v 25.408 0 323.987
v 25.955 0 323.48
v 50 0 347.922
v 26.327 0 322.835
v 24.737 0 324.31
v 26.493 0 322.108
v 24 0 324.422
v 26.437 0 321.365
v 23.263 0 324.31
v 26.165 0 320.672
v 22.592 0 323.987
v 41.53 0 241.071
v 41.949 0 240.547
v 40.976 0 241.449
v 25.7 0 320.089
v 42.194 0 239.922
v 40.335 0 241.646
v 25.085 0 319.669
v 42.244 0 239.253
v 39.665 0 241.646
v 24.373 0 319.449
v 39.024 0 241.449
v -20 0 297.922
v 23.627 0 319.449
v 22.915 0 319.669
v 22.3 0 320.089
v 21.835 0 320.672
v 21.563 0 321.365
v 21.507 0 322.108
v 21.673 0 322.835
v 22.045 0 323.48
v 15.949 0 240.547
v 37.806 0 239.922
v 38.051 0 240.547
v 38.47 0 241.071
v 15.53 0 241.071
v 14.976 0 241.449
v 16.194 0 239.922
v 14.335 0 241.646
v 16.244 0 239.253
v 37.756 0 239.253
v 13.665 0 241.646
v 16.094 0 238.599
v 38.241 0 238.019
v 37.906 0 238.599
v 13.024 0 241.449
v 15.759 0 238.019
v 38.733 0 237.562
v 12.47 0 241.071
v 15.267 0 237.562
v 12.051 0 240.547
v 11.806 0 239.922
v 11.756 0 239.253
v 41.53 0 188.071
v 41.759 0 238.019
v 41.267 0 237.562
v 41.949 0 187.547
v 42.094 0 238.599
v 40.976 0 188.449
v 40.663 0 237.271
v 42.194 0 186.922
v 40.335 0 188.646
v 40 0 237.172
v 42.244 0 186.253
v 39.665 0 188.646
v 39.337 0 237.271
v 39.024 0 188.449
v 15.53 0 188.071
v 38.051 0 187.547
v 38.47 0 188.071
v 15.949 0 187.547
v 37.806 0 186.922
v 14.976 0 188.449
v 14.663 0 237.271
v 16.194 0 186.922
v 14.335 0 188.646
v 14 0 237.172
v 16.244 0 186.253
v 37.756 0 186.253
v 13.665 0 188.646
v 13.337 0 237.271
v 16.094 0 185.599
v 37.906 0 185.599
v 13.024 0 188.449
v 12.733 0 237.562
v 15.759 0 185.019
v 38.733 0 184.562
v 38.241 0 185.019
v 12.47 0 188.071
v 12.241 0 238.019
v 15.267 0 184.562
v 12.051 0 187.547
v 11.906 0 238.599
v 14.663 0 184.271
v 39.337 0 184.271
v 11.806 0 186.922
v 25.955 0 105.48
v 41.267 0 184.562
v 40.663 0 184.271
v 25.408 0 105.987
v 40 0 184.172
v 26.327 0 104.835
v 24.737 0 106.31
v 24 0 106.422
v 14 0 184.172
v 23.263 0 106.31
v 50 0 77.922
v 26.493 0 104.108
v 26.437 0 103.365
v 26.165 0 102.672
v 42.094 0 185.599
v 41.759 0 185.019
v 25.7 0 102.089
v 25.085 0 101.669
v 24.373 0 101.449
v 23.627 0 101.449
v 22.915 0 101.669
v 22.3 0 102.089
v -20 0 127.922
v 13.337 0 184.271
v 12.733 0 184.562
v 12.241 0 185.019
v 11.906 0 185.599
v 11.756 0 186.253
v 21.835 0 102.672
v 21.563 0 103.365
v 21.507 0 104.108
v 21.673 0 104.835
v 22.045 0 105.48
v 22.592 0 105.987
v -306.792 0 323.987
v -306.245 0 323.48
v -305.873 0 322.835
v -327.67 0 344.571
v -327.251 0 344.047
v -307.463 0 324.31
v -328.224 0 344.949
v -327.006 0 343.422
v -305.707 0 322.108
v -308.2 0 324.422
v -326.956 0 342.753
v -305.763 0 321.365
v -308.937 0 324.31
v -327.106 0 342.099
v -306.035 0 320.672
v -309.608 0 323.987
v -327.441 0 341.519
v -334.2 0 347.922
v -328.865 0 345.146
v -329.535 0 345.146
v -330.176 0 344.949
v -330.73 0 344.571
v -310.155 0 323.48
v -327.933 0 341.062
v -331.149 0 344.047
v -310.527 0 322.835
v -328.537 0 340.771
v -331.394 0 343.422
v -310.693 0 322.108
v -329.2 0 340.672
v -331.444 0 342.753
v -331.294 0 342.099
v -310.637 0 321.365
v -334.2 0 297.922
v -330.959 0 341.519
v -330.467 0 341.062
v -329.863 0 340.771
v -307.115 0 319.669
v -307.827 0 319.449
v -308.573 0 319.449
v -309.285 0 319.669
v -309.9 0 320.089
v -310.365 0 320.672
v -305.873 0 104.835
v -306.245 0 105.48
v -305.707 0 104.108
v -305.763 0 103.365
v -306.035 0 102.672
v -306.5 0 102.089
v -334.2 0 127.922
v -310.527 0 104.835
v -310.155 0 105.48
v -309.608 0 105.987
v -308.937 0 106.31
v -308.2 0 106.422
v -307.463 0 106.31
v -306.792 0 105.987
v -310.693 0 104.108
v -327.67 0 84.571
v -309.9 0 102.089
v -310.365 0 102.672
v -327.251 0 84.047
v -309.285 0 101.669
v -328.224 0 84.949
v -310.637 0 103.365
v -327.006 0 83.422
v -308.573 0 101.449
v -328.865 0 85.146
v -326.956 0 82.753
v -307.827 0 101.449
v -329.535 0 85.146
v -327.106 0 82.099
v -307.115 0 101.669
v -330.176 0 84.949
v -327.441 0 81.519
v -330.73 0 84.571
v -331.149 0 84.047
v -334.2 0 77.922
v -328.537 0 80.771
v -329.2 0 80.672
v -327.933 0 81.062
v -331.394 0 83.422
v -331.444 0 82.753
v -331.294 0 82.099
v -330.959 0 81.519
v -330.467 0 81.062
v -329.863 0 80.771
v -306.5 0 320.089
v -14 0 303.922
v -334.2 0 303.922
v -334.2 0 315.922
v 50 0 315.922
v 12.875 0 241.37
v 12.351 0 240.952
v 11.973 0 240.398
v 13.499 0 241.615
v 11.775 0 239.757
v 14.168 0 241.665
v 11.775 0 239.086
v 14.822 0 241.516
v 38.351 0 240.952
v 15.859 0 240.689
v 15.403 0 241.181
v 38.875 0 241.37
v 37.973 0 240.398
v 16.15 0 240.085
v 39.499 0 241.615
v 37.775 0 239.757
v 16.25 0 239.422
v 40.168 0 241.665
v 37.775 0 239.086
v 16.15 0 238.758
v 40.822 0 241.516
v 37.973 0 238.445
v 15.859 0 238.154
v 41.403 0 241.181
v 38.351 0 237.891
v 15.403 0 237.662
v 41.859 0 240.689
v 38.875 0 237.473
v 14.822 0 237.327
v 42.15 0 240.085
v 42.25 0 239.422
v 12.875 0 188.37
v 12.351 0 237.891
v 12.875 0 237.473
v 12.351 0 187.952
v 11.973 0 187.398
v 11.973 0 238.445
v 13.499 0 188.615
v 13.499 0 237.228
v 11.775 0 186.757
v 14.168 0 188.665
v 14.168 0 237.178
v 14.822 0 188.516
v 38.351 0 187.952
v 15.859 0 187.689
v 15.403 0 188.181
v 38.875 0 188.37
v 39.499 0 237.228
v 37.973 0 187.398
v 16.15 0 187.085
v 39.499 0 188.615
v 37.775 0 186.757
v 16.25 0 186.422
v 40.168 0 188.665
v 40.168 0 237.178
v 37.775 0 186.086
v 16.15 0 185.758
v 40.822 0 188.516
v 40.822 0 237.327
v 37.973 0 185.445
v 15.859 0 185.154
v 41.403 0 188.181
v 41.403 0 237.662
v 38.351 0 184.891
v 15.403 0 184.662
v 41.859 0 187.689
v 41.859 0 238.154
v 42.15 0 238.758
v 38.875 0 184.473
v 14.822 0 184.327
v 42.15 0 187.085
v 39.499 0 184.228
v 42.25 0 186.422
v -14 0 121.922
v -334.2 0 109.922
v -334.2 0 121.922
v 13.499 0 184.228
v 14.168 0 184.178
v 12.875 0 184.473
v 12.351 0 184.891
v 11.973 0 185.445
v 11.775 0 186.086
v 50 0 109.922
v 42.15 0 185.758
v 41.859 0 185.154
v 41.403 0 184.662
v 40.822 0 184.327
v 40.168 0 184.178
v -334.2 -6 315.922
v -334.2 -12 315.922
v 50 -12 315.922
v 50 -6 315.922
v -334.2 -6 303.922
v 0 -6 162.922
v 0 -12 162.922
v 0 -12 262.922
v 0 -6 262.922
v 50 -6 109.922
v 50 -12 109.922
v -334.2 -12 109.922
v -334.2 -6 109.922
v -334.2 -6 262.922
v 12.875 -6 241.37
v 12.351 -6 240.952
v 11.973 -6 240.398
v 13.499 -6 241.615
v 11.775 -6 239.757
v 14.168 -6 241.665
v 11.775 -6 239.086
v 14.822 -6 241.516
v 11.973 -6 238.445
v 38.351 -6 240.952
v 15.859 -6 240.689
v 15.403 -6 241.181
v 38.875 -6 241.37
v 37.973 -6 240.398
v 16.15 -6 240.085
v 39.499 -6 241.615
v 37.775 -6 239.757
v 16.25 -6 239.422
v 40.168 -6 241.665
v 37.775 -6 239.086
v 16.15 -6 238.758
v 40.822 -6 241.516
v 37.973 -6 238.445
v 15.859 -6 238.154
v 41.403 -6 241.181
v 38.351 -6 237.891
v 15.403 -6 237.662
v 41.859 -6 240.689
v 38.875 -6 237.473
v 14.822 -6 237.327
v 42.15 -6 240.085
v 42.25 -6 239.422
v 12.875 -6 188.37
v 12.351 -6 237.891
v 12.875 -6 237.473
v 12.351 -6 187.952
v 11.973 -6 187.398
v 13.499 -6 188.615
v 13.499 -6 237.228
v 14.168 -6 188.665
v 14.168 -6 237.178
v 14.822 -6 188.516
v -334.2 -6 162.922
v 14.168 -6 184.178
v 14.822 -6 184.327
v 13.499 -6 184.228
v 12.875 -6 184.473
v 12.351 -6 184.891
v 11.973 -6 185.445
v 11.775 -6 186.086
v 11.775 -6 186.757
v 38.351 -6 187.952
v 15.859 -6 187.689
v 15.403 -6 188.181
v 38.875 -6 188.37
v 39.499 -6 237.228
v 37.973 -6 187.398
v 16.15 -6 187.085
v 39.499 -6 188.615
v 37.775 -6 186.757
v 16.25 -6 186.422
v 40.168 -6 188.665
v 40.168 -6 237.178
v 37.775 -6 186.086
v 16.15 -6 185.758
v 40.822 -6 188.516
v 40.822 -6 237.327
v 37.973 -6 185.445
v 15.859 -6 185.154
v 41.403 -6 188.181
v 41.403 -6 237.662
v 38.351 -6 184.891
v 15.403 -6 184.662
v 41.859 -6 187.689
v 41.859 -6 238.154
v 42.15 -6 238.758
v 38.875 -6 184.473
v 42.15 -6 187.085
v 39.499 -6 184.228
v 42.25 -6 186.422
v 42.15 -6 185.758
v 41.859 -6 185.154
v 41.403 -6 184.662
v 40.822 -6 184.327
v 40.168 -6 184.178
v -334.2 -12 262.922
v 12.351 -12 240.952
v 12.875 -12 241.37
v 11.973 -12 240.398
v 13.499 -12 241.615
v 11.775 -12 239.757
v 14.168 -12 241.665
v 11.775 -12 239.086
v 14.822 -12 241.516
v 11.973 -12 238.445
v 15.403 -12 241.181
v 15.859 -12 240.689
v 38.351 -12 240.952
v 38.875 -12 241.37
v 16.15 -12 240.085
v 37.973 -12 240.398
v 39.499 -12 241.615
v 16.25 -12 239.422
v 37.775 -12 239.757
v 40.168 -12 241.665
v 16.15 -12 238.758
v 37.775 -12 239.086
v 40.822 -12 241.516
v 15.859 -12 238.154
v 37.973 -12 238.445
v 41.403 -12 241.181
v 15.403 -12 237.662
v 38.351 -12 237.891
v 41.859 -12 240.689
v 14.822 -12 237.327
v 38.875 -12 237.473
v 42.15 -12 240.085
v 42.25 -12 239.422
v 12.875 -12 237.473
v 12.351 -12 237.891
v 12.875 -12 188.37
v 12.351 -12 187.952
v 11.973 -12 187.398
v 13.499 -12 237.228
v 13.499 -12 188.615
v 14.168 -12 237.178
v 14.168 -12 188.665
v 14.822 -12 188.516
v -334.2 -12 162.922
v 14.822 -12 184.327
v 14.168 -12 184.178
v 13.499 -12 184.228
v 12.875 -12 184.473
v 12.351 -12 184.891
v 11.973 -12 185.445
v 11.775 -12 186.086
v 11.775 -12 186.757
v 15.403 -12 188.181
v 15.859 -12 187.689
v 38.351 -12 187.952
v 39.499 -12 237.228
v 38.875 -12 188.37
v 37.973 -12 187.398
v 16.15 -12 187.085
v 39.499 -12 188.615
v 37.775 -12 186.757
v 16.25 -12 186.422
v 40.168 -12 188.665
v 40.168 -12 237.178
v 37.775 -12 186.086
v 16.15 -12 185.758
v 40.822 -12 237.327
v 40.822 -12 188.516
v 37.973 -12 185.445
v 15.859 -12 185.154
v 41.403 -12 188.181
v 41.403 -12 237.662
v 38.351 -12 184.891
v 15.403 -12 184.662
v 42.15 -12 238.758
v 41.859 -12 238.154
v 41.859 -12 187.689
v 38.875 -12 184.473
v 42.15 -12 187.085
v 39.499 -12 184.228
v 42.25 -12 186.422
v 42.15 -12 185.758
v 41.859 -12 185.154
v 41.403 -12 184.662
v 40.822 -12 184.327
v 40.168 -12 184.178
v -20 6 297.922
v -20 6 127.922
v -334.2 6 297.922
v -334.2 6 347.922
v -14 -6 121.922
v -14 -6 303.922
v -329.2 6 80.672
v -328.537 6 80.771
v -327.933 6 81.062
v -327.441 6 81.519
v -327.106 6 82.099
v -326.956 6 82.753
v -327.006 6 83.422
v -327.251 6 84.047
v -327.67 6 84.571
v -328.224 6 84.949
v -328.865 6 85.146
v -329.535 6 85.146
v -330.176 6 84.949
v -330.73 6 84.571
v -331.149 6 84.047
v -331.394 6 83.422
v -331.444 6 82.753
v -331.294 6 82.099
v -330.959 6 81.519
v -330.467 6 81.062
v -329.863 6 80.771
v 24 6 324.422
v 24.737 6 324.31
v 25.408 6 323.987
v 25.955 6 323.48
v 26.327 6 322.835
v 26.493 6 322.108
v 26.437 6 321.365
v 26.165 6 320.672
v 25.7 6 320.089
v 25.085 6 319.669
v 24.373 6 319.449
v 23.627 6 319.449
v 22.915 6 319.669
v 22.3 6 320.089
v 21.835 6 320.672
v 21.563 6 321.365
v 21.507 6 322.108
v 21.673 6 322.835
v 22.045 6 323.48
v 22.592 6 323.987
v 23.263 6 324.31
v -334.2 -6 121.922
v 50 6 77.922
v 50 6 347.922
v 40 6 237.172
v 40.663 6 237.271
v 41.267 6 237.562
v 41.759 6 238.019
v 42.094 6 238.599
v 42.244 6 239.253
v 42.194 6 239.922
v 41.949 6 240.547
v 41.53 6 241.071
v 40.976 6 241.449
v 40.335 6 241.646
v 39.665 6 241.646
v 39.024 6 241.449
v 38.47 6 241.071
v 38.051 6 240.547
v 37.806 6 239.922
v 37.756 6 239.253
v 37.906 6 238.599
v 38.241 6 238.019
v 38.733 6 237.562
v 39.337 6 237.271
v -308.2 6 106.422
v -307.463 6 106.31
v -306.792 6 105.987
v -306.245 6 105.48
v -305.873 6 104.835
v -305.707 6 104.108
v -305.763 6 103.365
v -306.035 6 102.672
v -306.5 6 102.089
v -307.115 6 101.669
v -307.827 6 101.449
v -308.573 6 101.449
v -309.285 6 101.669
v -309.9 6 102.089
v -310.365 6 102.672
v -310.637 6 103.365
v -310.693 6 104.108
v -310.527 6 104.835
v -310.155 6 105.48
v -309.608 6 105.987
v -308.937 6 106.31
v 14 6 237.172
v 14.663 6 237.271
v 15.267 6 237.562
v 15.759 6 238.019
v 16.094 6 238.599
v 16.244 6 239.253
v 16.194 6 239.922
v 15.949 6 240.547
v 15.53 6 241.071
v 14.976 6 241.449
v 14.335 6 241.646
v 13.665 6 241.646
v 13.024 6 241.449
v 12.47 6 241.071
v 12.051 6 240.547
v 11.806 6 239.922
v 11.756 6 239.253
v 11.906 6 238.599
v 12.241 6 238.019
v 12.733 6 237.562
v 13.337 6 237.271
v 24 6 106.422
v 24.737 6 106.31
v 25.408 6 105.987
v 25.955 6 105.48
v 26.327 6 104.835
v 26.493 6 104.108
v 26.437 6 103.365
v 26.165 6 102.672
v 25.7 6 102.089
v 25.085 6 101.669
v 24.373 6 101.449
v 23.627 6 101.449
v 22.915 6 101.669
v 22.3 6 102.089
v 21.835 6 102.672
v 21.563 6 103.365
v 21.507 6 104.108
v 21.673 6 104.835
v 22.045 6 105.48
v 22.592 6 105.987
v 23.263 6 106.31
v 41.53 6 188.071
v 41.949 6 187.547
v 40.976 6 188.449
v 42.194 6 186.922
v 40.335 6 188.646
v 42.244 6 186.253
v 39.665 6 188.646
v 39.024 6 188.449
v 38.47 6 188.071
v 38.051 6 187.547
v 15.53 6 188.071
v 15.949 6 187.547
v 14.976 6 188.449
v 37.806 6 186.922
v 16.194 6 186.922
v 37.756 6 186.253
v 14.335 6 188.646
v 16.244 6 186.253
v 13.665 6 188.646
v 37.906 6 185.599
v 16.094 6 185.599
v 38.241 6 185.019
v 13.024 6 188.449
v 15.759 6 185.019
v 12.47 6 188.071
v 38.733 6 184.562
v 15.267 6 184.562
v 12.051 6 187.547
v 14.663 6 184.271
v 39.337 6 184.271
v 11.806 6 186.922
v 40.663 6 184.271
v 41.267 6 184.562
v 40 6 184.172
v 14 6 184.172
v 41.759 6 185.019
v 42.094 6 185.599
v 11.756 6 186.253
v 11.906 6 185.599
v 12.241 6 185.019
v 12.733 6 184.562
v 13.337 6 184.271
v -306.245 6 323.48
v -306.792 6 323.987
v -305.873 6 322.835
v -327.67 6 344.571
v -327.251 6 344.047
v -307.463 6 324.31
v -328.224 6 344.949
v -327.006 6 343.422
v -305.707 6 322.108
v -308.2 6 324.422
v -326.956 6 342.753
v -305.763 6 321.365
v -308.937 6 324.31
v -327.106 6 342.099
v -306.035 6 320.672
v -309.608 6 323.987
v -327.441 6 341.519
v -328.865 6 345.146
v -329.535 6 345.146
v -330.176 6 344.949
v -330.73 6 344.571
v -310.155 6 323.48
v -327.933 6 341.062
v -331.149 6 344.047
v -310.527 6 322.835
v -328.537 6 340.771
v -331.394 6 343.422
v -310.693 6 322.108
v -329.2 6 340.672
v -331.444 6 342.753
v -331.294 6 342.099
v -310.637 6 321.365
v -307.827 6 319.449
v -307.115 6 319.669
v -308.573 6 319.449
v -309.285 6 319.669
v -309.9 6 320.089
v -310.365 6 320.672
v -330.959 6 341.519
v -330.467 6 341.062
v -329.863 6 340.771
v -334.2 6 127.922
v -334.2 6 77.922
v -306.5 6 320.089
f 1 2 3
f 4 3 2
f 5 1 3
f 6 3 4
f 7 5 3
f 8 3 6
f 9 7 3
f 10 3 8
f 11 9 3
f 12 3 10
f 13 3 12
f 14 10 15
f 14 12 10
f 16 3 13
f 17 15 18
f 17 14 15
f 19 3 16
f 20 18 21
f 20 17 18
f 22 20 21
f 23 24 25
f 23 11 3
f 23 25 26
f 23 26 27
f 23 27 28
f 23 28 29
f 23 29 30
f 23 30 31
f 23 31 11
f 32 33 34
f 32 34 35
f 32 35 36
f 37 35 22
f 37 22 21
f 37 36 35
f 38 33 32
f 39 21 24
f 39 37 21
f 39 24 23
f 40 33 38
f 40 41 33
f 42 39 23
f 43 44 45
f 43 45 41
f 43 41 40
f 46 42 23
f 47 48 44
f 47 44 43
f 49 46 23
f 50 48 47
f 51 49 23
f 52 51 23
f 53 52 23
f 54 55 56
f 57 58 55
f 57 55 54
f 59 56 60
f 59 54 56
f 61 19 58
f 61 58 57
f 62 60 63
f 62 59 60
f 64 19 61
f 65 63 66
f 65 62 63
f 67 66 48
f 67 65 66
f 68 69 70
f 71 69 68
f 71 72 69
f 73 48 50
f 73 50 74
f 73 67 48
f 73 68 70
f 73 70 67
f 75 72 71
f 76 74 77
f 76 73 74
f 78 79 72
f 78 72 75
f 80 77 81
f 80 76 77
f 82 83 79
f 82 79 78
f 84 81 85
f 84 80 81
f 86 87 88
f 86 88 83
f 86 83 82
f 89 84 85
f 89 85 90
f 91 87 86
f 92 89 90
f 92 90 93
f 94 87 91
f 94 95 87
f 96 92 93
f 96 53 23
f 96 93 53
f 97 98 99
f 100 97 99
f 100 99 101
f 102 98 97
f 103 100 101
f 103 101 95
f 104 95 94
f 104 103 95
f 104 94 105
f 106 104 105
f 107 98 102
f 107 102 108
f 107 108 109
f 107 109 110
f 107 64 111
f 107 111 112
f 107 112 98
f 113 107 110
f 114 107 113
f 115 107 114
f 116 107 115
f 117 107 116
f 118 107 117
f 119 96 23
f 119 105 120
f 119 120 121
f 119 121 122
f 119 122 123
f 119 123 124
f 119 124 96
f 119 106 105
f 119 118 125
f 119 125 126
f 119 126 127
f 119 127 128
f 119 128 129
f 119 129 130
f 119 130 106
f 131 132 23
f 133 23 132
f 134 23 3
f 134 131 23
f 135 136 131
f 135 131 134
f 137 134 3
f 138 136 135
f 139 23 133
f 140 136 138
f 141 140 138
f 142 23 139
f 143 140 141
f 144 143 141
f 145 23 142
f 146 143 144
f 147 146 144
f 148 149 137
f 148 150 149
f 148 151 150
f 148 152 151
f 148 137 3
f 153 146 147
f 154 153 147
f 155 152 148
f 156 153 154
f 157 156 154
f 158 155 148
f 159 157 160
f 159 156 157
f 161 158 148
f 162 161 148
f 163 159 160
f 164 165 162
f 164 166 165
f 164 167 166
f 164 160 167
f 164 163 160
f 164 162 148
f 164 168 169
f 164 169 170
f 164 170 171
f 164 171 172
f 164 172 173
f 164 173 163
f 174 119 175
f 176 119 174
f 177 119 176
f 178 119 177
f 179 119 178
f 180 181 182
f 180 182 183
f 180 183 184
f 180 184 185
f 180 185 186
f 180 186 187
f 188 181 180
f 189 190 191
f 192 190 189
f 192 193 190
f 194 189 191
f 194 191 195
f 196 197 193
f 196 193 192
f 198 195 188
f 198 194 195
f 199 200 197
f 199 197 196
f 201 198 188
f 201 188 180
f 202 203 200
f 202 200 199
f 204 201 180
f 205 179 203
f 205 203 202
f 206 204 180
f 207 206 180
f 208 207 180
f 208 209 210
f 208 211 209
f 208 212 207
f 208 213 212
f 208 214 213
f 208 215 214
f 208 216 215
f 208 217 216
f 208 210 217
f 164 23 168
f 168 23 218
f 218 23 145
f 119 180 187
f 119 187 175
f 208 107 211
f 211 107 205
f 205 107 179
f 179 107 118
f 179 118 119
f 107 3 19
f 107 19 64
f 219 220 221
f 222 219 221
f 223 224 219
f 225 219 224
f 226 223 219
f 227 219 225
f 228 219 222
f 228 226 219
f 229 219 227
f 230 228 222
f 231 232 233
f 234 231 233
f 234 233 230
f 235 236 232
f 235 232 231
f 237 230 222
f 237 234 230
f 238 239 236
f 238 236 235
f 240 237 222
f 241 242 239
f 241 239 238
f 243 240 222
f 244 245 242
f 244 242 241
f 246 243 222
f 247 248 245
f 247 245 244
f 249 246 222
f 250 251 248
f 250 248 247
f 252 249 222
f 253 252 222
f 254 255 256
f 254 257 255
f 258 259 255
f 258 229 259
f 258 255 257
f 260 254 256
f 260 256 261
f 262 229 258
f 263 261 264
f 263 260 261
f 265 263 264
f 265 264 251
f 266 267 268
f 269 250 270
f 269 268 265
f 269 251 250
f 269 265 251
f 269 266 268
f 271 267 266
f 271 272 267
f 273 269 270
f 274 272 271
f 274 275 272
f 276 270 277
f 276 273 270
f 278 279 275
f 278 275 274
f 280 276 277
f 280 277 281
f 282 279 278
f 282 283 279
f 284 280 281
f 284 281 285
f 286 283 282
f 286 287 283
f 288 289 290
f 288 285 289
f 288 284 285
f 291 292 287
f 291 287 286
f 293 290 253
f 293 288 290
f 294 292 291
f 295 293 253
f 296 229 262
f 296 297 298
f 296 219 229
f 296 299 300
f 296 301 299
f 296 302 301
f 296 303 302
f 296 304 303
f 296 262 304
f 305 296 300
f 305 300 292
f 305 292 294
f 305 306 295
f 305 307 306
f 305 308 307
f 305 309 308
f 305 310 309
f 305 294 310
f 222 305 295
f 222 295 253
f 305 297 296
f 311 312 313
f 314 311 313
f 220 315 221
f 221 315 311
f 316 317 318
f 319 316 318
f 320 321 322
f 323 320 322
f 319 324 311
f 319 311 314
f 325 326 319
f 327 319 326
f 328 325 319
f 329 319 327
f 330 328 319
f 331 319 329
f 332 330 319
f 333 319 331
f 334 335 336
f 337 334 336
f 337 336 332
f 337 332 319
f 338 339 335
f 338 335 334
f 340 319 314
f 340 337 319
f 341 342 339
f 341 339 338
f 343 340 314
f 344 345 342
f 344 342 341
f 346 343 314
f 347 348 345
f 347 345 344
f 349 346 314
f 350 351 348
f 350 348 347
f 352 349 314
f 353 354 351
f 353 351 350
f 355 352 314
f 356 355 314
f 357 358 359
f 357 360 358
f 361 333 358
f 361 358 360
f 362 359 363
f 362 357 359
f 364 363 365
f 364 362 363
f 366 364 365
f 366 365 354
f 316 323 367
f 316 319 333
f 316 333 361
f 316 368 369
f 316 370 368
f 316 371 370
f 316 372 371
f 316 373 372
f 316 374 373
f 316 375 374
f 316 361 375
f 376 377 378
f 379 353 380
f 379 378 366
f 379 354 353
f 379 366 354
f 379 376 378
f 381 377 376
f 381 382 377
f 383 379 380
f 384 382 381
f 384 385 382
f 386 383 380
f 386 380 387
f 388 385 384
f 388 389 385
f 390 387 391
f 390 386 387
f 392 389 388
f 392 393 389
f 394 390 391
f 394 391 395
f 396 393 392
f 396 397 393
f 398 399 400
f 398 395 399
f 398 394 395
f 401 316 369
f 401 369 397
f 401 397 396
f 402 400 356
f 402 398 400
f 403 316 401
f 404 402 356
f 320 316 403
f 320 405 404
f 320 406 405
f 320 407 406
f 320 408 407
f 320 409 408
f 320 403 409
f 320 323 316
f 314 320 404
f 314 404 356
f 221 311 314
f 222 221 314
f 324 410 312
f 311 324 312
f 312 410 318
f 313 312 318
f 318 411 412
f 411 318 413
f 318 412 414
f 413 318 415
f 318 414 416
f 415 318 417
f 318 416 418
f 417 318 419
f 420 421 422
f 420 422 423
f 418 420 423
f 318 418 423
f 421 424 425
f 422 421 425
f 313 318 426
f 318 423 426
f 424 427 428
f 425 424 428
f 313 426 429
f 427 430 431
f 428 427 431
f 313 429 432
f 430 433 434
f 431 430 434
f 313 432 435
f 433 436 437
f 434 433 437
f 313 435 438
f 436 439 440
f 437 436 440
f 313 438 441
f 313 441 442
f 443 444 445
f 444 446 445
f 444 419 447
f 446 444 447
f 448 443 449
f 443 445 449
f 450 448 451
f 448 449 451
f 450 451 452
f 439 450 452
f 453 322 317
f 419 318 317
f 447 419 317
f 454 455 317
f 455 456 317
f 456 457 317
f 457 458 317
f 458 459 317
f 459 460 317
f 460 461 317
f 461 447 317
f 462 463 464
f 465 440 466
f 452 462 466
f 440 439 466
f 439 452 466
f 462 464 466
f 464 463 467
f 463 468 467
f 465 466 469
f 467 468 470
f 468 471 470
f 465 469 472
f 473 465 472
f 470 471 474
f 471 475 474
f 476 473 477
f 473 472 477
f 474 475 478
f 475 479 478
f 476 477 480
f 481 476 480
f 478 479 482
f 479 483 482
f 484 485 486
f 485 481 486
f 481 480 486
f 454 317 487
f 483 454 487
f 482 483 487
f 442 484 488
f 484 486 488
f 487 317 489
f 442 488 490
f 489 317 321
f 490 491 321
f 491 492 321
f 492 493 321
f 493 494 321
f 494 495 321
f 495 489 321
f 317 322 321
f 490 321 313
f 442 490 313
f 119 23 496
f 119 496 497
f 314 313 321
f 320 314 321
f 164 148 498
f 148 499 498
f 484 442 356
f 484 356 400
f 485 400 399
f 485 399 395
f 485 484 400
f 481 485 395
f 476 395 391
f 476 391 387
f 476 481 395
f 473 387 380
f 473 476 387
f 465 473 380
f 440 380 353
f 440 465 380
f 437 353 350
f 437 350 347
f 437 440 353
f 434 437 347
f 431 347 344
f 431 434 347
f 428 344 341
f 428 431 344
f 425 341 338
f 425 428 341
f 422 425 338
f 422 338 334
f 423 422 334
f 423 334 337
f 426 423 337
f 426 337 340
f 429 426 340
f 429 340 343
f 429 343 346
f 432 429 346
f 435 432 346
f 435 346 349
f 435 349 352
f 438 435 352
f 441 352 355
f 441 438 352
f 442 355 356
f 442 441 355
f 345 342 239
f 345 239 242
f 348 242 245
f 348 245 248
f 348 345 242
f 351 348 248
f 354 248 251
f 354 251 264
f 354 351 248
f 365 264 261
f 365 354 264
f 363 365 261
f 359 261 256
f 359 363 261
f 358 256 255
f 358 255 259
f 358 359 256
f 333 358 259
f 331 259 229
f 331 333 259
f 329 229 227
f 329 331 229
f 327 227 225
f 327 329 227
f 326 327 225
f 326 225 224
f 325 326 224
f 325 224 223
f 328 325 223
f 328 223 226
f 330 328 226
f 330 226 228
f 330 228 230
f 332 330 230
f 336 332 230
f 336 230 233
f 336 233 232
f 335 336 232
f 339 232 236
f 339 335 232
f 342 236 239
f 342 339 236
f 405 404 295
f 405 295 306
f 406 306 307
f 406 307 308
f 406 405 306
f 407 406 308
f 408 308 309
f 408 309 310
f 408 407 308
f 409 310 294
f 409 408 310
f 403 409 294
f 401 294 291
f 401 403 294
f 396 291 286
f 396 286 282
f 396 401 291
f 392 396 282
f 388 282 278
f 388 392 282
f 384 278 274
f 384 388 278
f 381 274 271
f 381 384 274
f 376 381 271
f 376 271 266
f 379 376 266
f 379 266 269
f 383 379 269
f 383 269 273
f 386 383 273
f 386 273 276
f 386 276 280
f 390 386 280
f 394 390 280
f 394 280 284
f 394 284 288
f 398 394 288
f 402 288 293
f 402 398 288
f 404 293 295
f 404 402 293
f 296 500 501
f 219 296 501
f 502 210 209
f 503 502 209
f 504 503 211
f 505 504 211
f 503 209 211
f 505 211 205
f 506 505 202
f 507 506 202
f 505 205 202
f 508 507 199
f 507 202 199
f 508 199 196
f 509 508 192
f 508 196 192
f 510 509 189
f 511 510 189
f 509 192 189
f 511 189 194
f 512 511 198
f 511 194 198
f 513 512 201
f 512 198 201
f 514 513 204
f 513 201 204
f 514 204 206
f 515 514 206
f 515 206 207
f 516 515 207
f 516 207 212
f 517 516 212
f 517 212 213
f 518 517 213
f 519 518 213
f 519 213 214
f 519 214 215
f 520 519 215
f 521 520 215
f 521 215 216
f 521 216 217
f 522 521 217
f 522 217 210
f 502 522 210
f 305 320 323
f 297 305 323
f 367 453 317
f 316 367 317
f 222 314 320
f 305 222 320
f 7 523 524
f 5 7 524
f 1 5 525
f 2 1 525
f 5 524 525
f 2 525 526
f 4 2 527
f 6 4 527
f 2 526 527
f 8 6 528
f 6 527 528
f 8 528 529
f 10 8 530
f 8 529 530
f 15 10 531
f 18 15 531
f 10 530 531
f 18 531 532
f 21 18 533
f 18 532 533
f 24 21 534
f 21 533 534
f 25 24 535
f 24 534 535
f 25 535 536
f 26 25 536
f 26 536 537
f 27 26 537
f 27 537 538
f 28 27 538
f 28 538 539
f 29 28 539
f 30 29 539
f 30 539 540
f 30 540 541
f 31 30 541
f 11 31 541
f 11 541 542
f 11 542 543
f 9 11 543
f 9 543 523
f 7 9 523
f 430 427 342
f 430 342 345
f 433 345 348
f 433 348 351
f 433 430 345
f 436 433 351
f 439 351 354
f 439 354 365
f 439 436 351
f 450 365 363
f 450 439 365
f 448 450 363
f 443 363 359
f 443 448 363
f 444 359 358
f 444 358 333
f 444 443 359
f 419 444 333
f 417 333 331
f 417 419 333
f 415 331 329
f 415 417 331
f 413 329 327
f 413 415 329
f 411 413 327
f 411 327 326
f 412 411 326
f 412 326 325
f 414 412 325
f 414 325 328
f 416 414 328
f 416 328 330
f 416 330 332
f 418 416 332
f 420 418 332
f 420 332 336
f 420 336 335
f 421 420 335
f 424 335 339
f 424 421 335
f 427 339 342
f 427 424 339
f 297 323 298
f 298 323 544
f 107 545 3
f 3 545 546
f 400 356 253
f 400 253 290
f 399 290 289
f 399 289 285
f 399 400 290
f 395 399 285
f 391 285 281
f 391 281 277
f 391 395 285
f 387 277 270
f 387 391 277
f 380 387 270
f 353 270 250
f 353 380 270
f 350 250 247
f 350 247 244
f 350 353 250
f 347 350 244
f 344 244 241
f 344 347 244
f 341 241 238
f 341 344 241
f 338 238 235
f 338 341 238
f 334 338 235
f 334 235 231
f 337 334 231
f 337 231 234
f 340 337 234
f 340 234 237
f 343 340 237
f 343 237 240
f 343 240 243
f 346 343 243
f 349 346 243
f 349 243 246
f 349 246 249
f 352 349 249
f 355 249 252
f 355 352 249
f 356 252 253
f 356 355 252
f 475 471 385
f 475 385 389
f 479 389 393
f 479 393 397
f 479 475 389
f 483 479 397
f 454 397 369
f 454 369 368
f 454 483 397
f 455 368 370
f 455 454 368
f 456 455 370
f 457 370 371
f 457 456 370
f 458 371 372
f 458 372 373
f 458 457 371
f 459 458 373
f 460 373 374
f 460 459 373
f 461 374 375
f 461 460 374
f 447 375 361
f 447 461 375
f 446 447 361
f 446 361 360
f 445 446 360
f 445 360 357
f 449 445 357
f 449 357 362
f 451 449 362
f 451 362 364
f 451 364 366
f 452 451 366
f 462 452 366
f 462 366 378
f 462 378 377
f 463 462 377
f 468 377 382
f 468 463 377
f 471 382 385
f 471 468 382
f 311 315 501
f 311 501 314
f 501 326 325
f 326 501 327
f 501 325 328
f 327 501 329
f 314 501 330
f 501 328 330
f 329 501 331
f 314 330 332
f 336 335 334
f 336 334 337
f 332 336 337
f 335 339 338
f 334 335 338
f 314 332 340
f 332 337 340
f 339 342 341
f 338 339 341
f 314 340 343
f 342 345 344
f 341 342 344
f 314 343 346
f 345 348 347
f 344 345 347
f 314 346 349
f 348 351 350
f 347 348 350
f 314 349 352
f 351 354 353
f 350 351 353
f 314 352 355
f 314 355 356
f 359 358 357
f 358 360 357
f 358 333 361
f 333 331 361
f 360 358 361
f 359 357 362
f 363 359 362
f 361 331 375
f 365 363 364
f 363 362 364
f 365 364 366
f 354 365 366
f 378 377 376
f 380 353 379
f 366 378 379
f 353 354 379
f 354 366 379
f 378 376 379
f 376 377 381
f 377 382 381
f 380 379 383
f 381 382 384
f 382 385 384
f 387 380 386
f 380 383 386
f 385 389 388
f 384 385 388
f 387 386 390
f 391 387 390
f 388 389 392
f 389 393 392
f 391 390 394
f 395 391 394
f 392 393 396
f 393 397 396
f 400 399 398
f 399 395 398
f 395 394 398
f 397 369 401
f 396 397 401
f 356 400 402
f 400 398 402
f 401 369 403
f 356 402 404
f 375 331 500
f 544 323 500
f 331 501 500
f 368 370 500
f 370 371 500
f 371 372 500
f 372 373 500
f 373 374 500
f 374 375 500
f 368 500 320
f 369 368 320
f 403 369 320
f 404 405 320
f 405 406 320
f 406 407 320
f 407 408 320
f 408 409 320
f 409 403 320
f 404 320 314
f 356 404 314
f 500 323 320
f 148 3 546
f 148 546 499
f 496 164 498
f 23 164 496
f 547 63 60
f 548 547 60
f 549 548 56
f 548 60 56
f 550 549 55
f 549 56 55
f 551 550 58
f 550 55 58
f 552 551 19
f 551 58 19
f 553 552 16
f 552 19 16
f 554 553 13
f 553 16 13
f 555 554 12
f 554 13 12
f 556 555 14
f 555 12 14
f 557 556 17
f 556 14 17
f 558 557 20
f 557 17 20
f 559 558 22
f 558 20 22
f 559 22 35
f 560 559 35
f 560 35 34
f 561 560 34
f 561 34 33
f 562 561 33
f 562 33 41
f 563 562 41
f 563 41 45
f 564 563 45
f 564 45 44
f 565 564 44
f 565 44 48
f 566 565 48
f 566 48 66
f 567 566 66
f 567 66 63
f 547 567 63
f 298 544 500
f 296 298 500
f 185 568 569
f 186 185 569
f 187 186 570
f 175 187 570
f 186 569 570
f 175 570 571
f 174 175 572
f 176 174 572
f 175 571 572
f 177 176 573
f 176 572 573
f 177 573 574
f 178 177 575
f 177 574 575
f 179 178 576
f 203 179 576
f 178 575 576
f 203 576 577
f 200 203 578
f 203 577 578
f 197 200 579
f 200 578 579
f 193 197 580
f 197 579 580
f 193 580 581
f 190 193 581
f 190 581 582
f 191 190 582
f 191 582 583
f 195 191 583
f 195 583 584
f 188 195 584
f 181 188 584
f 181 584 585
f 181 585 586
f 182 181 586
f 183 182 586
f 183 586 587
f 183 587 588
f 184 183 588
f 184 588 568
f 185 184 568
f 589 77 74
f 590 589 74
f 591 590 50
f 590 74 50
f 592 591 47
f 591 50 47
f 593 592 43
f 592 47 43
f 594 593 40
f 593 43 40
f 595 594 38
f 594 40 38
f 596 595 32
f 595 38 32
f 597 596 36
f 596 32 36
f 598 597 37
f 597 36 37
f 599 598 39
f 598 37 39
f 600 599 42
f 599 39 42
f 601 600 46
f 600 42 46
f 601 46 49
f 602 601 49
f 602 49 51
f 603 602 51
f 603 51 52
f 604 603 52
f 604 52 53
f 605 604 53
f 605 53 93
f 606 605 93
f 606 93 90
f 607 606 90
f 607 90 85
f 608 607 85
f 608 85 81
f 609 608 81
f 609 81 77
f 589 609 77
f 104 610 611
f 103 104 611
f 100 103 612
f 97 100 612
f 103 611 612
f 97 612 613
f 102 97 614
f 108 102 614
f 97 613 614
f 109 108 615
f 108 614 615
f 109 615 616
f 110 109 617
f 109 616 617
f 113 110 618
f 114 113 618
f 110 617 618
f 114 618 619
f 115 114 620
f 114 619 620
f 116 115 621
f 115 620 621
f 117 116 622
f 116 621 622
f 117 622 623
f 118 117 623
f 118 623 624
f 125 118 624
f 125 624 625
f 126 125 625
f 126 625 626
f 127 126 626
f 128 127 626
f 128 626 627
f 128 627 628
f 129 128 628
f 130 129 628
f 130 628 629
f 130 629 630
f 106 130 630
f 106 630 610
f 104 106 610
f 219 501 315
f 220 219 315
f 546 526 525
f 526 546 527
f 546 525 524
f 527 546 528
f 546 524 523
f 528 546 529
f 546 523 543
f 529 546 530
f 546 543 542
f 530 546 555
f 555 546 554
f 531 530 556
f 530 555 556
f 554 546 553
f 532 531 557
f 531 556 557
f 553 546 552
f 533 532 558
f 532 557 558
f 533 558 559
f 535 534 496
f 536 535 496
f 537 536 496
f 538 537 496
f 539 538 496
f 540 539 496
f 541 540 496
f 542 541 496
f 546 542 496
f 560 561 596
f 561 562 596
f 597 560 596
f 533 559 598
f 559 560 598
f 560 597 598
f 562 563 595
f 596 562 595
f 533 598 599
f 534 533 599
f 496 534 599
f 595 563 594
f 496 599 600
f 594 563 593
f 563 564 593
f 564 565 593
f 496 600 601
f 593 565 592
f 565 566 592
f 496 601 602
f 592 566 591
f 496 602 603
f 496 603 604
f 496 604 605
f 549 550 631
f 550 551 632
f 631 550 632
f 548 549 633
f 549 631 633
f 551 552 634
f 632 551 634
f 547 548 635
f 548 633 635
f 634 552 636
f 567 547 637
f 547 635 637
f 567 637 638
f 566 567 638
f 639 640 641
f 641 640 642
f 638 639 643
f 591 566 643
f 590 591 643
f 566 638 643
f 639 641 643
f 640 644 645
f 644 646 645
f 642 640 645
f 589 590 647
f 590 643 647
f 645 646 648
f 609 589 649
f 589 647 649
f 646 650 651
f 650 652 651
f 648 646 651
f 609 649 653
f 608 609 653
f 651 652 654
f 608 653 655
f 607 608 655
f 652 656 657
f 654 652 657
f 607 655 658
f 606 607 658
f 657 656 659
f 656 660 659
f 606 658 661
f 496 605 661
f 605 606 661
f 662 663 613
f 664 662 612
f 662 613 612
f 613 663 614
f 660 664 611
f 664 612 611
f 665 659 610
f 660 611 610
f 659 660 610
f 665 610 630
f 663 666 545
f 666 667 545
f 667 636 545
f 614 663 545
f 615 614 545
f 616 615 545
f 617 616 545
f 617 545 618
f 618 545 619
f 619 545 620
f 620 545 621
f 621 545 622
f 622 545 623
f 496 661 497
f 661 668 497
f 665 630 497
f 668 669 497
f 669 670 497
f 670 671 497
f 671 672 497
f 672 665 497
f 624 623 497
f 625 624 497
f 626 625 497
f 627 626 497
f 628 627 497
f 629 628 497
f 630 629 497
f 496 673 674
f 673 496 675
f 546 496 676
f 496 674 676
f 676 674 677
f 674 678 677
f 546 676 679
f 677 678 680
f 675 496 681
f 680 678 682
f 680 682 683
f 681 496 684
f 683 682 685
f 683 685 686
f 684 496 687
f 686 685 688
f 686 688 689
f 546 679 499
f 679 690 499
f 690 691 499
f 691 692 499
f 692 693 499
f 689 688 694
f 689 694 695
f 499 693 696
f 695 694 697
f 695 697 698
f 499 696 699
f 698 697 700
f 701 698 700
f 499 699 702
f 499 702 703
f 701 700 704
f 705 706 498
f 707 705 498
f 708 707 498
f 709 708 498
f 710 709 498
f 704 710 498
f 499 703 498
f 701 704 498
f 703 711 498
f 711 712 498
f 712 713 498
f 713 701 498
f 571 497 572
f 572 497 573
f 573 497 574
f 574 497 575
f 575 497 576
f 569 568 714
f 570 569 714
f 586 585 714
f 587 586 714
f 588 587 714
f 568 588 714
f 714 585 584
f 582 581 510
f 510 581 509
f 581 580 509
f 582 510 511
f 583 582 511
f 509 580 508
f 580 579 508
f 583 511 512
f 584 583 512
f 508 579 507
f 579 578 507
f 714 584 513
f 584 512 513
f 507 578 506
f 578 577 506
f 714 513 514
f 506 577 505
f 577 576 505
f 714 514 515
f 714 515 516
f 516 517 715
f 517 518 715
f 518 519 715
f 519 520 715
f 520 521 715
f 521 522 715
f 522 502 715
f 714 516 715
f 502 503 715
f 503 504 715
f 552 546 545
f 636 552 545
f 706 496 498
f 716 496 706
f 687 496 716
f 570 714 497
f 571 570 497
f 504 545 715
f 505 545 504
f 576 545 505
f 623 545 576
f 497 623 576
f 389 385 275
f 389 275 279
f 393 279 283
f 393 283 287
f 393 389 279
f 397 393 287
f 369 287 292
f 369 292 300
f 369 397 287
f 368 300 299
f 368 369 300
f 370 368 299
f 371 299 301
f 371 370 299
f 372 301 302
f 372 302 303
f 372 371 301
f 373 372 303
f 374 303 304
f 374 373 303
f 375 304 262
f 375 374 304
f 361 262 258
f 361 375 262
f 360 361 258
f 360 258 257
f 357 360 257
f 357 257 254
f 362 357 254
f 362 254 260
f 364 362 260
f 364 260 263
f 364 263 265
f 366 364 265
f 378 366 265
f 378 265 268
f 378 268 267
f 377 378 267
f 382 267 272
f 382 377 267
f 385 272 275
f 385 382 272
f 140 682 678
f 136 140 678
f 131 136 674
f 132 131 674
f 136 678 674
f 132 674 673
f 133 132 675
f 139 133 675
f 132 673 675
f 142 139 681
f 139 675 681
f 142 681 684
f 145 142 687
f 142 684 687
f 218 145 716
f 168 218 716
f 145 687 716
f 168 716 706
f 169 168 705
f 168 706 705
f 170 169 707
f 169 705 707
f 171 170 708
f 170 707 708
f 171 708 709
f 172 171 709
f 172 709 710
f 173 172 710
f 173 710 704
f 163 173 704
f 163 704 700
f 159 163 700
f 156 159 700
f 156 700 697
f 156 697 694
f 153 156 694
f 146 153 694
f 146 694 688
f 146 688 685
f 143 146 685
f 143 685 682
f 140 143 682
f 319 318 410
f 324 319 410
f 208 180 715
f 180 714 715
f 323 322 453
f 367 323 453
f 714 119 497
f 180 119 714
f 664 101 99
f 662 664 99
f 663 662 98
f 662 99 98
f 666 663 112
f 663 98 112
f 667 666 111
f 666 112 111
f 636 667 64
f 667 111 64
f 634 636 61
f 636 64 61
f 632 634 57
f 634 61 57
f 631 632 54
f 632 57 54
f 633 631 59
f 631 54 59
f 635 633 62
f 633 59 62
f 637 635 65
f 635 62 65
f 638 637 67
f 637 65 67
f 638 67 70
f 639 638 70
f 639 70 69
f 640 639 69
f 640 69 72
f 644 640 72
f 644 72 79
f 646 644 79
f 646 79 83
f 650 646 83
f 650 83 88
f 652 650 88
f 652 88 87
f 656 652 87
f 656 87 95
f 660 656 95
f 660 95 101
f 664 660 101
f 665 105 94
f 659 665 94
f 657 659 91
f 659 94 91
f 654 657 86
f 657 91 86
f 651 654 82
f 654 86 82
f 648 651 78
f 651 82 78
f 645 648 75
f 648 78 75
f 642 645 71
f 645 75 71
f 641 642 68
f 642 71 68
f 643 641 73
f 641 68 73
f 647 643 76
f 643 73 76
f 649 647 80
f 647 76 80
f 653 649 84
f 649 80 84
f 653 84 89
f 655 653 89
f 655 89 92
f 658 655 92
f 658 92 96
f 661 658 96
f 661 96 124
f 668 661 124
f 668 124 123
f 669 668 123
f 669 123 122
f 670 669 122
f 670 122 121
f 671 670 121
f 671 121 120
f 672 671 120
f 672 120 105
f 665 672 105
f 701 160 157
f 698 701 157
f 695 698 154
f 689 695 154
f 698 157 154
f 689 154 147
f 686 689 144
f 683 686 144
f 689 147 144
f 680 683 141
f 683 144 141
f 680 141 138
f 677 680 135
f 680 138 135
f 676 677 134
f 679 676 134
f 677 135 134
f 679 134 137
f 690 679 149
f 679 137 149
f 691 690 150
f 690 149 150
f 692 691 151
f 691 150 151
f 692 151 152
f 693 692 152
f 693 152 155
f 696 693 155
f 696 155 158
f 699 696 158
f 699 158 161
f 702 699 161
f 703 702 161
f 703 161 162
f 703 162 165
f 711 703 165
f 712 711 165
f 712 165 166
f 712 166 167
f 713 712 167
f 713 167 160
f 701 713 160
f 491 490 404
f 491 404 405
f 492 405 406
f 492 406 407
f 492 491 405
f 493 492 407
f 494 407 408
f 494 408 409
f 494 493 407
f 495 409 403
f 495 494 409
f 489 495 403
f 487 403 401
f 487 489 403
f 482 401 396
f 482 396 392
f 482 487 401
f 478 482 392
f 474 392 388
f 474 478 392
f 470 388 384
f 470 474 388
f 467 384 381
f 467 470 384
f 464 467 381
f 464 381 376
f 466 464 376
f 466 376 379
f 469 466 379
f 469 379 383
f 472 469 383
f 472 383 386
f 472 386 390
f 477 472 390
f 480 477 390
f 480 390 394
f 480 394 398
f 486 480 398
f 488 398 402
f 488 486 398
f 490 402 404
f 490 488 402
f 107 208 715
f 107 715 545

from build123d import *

# Parameters (mm, degrees)
EXTRUDE_2_DEPTH             = 6
EXTRUDE_3_DEPTH             = 6
SKETCH_4_R                  = 2.5
CUT_EXTRUDE_1_DEPTH         = 483.579543495
PATTERN_LINEAR_2_COUNT      = 2
PATTERN_LINEAR_2_PITCH      = 332.2
PATTERN_LINEAR_2_COUNT_DIR2 = 2
PATTERN_LINEAR_2_PITCH_DIR2 = 218
EXTRUDE_4_DEPTH             = 6
SKETCH_6_R                  = 2.25
CUT_EXTRUDE_2_DEPTH         = 483.766005224
SKETCH_7_R                  = 2.25
CUT_EXTRUDE_3_DEPTH         = 483.579543495
SPLIT_START                 = -12
SPLIT_BODIES_1_OUTLINE_R    = 2.25
SPLIT_BODIES_1_DEPTH        = 12
SPLIT_START_2               = -6
SPLIT_BODIES_1_2_OUTLINE_R  = 2.25
SPLIT_BODIES_1_2_DEPTH      = 6
SPLIT_BODIES_1_3_OUTLINE_R  = 2.25
SPLIT_BODIES_1_3_DEPTH      = 6


# Read off the part's stored shape, not the designer's step: Разделить1
with BuildPart() as part:
    # Эскиз1 → Бобышка-Вытянуть2 (new body)
    with BuildSketch(Plane(origin=(0, 0, 0), x_dir=(1, 0, 0), z_dir=(0, 1, 0))):
        Polygon((50, -77.921508101), (50, -347.921508101), (-334.2, -347.921508101), (-334.2, -297.921508101), (-20, -297.921508101), (-20, -127.921508101), (-334.2, -127.921508101), (-334.2, -77.921508101), align=None)
    extrude(amount=EXTRUDE_2_DEPTH)

    # Эскиз2 → Бобышка-Вытянуть3 (add)
    with BuildSketch(Plane.XZ):
        Polygon((50, 315.921508101), (50, 109.921508101), (-334.2, 109.921508101), (-334.2, 121.921508101), (-14, 121.921508101), (-14, 303.921508101), (-334.2, 303.921508101), (-334.2, 315.921508101), align=None)
    extrude(amount=EXTRUDE_3_DEPTH)

    # Эскиз4 → Вырез-Вытянуть1 (cut, through all)
    with BuildSketch(Plane(origin=(0, 6, 0), x_dir=(1, 0, 0), z_dir=(0, 1, 0))):
        with Locations(Location((-308.2, -103.921508101, 0), (0, 0, 270))):
            Circle(SKETCH_4_R)
    cut_extrude_1 = extrude(amount=-CUT_EXTRUDE_1_DEPTH, mode=Mode.SUBTRACT)

    # Линейный массив2: Cut-Extrude 1 2 × 2
    with Locations(*[(i * PATTERN_LINEAR_2_PITCH, 0, j * PATTERN_LINEAR_2_PITCH_DIR2) for i in range(PATTERN_LINEAR_2_COUNT) for j in range(PATTERN_LINEAR_2_COUNT_DIR2) if (i, j) != (0, 0)]):
        add(cut_extrude_1, mode=Mode.SUBTRACT)

    # Эскиз5 → Бобышка-Вытянуть4 (add)
    with BuildSketch(Plane.XZ.offset(6)):
        Polygon((50, 315.921508101), (-334.2, 315.921508101), (-334.2, 262.921508101), (0, 262.921508101), (0, 162.921508101), (-334.2, 162.921508101), (-334.2, 109.921508101), (50, 109.921508101), align=None)
    extrude(amount=EXTRUDE_4_DEPTH)

    # Эскиз6 → Вырез-Вытянуть2 (cut, through all)
    with BuildSketch(Plane.XZ.offset(12)):
        with Locations(Location((14, 239.421508101, 0), (0, 0, 270))):
            Circle(SKETCH_6_R)
        with Locations(Location((40, 239.421508101, 0), (0, 0, 270))):
            Circle(SKETCH_6_R)
        with Locations(Location((40, 186.421508101, 0), (0, 0, 270))):
            Circle(SKETCH_6_R)
        with Locations(Location((14, 186.421508101, 0), (0, 0, 270))):
            Circle(SKETCH_6_R)
    extrude(amount=-CUT_EXTRUDE_2_DEPTH, mode=Mode.SUBTRACT)

    # Эскиз7 → Вырез-Вытянуть3 (cut, through all)
    with BuildSketch(Plane.XZ):
        with Locations(Location((-329.2, 342.921508101, 0), (0, 0, 270))):
            Circle(SKETCH_7_R)
        with Locations(Location((-329.2, 82.921508101, 0), (0, 0, 270))):
            Circle(SKETCH_7_R)
    extrude(amount=-CUT_EXTRUDE_3_DEPTH, mode=Mode.SUBTRACT)

    # Split Bodies 1 outline → Split Bodies 1 (cut)
    with BuildSketch(Plane(origin=(0, 0, 0), x_dir=(1, 0, 0), z_dir=(0, 1, 0)).offset(SPLIT_START)):
        Polygon((-334.2, -162.921508101), (-14, -162.921508101), (-14, -262.921508101), (-334.2, -262.921508101), (-334.2, -315.921508101), (50, -315.921508101), (50, -109.921508101), (-334.2, -109.921508101), align=None)
        with Locations((14, -186.421508101)):
            Circle(SPLIT_BODIES_1_OUTLINE_R, mode=Mode.SUBTRACT)
        with Locations((40, -186.421508101)):
            Circle(SPLIT_BODIES_1_OUTLINE_R, mode=Mode.SUBTRACT)
        with Locations((14, -239.421508101)):
            Circle(SPLIT_BODIES_1_OUTLINE_R, mode=Mode.SUBTRACT)
        with Locations((40, -239.421508101)):
            Circle(SPLIT_BODIES_1_OUTLINE_R, mode=Mode.SUBTRACT)
    extrude(amount=SPLIT_BODIES_1_DEPTH, mode=Mode.SUBTRACT)


with BuildPart() as body_2:
    # Split Bodies 1 2 outline → Split Bodies 1 2 (new body)
    with BuildSketch(Plane(origin=(0, 0, 0), x_dir=(1, 0, 0), z_dir=(0, 1, 0)).offset(SPLIT_START_2)):
        Polygon((-334.2, -303.921508101), (-334.2, -315.921508101), (50, -315.921508101), (50, -109.921508101), (-334.2, -109.921508101), (-334.2, -121.921508101), (-14, -121.921508101), (-14, -303.921508101), align=None)
        with Locations((14, -239.421508101)):
            Circle(SPLIT_BODIES_1_2_OUTLINE_R, mode=Mode.SUBTRACT)
        with Locations((40, -239.421508101)):
            Circle(SPLIT_BODIES_1_2_OUTLINE_R, mode=Mode.SUBTRACT)
        with Locations((14, -186.421508101)):
            Circle(SPLIT_BODIES_1_2_OUTLINE_R, mode=Mode.SUBTRACT)
        with Locations((40, -186.421508101)):
            Circle(SPLIT_BODIES_1_2_OUTLINE_R, mode=Mode.SUBTRACT)
    extrude(amount=SPLIT_BODIES_1_2_DEPTH)


with BuildPart() as body_3:
    # Split Bodies 1 3 outline → Split Bodies 1 3 (new body)
    with BuildSketch(Plane(origin=(0, 0, 0), x_dir=(1, 0, 0), z_dir=(0, 1, 0)).offset(SPLIT_START)):
        Polygon((50, -315.921508101), (50, -109.921508101), (-334.2, -109.921508101), (-334.2, -162.921508101), (0, -162.921508101), (0, -262.921508101), (-334.2, -262.921508101), (-334.2, -315.921508101), align=None)
        with Locations((14, -239.421508101)):
            Circle(SPLIT_BODIES_1_3_OUTLINE_R, mode=Mode.SUBTRACT)
        with Locations((40, -239.421508101)):
            Circle(SPLIT_BODIES_1_3_OUTLINE_R, mode=Mode.SUBTRACT)
        with Locations((14, -186.421508101)):
            Circle(SPLIT_BODIES_1_3_OUTLINE_R, mode=Mode.SUBTRACT)
        with Locations((40, -186.421508101)):
            Circle(SPLIT_BODIES_1_3_OUTLINE_R, mode=Mode.SUBTRACT)
    extrude(amount=SPLIT_BODIES_1_3_DEPTH)


solid = Compound([part.part, body_2.part, body_3.part])
